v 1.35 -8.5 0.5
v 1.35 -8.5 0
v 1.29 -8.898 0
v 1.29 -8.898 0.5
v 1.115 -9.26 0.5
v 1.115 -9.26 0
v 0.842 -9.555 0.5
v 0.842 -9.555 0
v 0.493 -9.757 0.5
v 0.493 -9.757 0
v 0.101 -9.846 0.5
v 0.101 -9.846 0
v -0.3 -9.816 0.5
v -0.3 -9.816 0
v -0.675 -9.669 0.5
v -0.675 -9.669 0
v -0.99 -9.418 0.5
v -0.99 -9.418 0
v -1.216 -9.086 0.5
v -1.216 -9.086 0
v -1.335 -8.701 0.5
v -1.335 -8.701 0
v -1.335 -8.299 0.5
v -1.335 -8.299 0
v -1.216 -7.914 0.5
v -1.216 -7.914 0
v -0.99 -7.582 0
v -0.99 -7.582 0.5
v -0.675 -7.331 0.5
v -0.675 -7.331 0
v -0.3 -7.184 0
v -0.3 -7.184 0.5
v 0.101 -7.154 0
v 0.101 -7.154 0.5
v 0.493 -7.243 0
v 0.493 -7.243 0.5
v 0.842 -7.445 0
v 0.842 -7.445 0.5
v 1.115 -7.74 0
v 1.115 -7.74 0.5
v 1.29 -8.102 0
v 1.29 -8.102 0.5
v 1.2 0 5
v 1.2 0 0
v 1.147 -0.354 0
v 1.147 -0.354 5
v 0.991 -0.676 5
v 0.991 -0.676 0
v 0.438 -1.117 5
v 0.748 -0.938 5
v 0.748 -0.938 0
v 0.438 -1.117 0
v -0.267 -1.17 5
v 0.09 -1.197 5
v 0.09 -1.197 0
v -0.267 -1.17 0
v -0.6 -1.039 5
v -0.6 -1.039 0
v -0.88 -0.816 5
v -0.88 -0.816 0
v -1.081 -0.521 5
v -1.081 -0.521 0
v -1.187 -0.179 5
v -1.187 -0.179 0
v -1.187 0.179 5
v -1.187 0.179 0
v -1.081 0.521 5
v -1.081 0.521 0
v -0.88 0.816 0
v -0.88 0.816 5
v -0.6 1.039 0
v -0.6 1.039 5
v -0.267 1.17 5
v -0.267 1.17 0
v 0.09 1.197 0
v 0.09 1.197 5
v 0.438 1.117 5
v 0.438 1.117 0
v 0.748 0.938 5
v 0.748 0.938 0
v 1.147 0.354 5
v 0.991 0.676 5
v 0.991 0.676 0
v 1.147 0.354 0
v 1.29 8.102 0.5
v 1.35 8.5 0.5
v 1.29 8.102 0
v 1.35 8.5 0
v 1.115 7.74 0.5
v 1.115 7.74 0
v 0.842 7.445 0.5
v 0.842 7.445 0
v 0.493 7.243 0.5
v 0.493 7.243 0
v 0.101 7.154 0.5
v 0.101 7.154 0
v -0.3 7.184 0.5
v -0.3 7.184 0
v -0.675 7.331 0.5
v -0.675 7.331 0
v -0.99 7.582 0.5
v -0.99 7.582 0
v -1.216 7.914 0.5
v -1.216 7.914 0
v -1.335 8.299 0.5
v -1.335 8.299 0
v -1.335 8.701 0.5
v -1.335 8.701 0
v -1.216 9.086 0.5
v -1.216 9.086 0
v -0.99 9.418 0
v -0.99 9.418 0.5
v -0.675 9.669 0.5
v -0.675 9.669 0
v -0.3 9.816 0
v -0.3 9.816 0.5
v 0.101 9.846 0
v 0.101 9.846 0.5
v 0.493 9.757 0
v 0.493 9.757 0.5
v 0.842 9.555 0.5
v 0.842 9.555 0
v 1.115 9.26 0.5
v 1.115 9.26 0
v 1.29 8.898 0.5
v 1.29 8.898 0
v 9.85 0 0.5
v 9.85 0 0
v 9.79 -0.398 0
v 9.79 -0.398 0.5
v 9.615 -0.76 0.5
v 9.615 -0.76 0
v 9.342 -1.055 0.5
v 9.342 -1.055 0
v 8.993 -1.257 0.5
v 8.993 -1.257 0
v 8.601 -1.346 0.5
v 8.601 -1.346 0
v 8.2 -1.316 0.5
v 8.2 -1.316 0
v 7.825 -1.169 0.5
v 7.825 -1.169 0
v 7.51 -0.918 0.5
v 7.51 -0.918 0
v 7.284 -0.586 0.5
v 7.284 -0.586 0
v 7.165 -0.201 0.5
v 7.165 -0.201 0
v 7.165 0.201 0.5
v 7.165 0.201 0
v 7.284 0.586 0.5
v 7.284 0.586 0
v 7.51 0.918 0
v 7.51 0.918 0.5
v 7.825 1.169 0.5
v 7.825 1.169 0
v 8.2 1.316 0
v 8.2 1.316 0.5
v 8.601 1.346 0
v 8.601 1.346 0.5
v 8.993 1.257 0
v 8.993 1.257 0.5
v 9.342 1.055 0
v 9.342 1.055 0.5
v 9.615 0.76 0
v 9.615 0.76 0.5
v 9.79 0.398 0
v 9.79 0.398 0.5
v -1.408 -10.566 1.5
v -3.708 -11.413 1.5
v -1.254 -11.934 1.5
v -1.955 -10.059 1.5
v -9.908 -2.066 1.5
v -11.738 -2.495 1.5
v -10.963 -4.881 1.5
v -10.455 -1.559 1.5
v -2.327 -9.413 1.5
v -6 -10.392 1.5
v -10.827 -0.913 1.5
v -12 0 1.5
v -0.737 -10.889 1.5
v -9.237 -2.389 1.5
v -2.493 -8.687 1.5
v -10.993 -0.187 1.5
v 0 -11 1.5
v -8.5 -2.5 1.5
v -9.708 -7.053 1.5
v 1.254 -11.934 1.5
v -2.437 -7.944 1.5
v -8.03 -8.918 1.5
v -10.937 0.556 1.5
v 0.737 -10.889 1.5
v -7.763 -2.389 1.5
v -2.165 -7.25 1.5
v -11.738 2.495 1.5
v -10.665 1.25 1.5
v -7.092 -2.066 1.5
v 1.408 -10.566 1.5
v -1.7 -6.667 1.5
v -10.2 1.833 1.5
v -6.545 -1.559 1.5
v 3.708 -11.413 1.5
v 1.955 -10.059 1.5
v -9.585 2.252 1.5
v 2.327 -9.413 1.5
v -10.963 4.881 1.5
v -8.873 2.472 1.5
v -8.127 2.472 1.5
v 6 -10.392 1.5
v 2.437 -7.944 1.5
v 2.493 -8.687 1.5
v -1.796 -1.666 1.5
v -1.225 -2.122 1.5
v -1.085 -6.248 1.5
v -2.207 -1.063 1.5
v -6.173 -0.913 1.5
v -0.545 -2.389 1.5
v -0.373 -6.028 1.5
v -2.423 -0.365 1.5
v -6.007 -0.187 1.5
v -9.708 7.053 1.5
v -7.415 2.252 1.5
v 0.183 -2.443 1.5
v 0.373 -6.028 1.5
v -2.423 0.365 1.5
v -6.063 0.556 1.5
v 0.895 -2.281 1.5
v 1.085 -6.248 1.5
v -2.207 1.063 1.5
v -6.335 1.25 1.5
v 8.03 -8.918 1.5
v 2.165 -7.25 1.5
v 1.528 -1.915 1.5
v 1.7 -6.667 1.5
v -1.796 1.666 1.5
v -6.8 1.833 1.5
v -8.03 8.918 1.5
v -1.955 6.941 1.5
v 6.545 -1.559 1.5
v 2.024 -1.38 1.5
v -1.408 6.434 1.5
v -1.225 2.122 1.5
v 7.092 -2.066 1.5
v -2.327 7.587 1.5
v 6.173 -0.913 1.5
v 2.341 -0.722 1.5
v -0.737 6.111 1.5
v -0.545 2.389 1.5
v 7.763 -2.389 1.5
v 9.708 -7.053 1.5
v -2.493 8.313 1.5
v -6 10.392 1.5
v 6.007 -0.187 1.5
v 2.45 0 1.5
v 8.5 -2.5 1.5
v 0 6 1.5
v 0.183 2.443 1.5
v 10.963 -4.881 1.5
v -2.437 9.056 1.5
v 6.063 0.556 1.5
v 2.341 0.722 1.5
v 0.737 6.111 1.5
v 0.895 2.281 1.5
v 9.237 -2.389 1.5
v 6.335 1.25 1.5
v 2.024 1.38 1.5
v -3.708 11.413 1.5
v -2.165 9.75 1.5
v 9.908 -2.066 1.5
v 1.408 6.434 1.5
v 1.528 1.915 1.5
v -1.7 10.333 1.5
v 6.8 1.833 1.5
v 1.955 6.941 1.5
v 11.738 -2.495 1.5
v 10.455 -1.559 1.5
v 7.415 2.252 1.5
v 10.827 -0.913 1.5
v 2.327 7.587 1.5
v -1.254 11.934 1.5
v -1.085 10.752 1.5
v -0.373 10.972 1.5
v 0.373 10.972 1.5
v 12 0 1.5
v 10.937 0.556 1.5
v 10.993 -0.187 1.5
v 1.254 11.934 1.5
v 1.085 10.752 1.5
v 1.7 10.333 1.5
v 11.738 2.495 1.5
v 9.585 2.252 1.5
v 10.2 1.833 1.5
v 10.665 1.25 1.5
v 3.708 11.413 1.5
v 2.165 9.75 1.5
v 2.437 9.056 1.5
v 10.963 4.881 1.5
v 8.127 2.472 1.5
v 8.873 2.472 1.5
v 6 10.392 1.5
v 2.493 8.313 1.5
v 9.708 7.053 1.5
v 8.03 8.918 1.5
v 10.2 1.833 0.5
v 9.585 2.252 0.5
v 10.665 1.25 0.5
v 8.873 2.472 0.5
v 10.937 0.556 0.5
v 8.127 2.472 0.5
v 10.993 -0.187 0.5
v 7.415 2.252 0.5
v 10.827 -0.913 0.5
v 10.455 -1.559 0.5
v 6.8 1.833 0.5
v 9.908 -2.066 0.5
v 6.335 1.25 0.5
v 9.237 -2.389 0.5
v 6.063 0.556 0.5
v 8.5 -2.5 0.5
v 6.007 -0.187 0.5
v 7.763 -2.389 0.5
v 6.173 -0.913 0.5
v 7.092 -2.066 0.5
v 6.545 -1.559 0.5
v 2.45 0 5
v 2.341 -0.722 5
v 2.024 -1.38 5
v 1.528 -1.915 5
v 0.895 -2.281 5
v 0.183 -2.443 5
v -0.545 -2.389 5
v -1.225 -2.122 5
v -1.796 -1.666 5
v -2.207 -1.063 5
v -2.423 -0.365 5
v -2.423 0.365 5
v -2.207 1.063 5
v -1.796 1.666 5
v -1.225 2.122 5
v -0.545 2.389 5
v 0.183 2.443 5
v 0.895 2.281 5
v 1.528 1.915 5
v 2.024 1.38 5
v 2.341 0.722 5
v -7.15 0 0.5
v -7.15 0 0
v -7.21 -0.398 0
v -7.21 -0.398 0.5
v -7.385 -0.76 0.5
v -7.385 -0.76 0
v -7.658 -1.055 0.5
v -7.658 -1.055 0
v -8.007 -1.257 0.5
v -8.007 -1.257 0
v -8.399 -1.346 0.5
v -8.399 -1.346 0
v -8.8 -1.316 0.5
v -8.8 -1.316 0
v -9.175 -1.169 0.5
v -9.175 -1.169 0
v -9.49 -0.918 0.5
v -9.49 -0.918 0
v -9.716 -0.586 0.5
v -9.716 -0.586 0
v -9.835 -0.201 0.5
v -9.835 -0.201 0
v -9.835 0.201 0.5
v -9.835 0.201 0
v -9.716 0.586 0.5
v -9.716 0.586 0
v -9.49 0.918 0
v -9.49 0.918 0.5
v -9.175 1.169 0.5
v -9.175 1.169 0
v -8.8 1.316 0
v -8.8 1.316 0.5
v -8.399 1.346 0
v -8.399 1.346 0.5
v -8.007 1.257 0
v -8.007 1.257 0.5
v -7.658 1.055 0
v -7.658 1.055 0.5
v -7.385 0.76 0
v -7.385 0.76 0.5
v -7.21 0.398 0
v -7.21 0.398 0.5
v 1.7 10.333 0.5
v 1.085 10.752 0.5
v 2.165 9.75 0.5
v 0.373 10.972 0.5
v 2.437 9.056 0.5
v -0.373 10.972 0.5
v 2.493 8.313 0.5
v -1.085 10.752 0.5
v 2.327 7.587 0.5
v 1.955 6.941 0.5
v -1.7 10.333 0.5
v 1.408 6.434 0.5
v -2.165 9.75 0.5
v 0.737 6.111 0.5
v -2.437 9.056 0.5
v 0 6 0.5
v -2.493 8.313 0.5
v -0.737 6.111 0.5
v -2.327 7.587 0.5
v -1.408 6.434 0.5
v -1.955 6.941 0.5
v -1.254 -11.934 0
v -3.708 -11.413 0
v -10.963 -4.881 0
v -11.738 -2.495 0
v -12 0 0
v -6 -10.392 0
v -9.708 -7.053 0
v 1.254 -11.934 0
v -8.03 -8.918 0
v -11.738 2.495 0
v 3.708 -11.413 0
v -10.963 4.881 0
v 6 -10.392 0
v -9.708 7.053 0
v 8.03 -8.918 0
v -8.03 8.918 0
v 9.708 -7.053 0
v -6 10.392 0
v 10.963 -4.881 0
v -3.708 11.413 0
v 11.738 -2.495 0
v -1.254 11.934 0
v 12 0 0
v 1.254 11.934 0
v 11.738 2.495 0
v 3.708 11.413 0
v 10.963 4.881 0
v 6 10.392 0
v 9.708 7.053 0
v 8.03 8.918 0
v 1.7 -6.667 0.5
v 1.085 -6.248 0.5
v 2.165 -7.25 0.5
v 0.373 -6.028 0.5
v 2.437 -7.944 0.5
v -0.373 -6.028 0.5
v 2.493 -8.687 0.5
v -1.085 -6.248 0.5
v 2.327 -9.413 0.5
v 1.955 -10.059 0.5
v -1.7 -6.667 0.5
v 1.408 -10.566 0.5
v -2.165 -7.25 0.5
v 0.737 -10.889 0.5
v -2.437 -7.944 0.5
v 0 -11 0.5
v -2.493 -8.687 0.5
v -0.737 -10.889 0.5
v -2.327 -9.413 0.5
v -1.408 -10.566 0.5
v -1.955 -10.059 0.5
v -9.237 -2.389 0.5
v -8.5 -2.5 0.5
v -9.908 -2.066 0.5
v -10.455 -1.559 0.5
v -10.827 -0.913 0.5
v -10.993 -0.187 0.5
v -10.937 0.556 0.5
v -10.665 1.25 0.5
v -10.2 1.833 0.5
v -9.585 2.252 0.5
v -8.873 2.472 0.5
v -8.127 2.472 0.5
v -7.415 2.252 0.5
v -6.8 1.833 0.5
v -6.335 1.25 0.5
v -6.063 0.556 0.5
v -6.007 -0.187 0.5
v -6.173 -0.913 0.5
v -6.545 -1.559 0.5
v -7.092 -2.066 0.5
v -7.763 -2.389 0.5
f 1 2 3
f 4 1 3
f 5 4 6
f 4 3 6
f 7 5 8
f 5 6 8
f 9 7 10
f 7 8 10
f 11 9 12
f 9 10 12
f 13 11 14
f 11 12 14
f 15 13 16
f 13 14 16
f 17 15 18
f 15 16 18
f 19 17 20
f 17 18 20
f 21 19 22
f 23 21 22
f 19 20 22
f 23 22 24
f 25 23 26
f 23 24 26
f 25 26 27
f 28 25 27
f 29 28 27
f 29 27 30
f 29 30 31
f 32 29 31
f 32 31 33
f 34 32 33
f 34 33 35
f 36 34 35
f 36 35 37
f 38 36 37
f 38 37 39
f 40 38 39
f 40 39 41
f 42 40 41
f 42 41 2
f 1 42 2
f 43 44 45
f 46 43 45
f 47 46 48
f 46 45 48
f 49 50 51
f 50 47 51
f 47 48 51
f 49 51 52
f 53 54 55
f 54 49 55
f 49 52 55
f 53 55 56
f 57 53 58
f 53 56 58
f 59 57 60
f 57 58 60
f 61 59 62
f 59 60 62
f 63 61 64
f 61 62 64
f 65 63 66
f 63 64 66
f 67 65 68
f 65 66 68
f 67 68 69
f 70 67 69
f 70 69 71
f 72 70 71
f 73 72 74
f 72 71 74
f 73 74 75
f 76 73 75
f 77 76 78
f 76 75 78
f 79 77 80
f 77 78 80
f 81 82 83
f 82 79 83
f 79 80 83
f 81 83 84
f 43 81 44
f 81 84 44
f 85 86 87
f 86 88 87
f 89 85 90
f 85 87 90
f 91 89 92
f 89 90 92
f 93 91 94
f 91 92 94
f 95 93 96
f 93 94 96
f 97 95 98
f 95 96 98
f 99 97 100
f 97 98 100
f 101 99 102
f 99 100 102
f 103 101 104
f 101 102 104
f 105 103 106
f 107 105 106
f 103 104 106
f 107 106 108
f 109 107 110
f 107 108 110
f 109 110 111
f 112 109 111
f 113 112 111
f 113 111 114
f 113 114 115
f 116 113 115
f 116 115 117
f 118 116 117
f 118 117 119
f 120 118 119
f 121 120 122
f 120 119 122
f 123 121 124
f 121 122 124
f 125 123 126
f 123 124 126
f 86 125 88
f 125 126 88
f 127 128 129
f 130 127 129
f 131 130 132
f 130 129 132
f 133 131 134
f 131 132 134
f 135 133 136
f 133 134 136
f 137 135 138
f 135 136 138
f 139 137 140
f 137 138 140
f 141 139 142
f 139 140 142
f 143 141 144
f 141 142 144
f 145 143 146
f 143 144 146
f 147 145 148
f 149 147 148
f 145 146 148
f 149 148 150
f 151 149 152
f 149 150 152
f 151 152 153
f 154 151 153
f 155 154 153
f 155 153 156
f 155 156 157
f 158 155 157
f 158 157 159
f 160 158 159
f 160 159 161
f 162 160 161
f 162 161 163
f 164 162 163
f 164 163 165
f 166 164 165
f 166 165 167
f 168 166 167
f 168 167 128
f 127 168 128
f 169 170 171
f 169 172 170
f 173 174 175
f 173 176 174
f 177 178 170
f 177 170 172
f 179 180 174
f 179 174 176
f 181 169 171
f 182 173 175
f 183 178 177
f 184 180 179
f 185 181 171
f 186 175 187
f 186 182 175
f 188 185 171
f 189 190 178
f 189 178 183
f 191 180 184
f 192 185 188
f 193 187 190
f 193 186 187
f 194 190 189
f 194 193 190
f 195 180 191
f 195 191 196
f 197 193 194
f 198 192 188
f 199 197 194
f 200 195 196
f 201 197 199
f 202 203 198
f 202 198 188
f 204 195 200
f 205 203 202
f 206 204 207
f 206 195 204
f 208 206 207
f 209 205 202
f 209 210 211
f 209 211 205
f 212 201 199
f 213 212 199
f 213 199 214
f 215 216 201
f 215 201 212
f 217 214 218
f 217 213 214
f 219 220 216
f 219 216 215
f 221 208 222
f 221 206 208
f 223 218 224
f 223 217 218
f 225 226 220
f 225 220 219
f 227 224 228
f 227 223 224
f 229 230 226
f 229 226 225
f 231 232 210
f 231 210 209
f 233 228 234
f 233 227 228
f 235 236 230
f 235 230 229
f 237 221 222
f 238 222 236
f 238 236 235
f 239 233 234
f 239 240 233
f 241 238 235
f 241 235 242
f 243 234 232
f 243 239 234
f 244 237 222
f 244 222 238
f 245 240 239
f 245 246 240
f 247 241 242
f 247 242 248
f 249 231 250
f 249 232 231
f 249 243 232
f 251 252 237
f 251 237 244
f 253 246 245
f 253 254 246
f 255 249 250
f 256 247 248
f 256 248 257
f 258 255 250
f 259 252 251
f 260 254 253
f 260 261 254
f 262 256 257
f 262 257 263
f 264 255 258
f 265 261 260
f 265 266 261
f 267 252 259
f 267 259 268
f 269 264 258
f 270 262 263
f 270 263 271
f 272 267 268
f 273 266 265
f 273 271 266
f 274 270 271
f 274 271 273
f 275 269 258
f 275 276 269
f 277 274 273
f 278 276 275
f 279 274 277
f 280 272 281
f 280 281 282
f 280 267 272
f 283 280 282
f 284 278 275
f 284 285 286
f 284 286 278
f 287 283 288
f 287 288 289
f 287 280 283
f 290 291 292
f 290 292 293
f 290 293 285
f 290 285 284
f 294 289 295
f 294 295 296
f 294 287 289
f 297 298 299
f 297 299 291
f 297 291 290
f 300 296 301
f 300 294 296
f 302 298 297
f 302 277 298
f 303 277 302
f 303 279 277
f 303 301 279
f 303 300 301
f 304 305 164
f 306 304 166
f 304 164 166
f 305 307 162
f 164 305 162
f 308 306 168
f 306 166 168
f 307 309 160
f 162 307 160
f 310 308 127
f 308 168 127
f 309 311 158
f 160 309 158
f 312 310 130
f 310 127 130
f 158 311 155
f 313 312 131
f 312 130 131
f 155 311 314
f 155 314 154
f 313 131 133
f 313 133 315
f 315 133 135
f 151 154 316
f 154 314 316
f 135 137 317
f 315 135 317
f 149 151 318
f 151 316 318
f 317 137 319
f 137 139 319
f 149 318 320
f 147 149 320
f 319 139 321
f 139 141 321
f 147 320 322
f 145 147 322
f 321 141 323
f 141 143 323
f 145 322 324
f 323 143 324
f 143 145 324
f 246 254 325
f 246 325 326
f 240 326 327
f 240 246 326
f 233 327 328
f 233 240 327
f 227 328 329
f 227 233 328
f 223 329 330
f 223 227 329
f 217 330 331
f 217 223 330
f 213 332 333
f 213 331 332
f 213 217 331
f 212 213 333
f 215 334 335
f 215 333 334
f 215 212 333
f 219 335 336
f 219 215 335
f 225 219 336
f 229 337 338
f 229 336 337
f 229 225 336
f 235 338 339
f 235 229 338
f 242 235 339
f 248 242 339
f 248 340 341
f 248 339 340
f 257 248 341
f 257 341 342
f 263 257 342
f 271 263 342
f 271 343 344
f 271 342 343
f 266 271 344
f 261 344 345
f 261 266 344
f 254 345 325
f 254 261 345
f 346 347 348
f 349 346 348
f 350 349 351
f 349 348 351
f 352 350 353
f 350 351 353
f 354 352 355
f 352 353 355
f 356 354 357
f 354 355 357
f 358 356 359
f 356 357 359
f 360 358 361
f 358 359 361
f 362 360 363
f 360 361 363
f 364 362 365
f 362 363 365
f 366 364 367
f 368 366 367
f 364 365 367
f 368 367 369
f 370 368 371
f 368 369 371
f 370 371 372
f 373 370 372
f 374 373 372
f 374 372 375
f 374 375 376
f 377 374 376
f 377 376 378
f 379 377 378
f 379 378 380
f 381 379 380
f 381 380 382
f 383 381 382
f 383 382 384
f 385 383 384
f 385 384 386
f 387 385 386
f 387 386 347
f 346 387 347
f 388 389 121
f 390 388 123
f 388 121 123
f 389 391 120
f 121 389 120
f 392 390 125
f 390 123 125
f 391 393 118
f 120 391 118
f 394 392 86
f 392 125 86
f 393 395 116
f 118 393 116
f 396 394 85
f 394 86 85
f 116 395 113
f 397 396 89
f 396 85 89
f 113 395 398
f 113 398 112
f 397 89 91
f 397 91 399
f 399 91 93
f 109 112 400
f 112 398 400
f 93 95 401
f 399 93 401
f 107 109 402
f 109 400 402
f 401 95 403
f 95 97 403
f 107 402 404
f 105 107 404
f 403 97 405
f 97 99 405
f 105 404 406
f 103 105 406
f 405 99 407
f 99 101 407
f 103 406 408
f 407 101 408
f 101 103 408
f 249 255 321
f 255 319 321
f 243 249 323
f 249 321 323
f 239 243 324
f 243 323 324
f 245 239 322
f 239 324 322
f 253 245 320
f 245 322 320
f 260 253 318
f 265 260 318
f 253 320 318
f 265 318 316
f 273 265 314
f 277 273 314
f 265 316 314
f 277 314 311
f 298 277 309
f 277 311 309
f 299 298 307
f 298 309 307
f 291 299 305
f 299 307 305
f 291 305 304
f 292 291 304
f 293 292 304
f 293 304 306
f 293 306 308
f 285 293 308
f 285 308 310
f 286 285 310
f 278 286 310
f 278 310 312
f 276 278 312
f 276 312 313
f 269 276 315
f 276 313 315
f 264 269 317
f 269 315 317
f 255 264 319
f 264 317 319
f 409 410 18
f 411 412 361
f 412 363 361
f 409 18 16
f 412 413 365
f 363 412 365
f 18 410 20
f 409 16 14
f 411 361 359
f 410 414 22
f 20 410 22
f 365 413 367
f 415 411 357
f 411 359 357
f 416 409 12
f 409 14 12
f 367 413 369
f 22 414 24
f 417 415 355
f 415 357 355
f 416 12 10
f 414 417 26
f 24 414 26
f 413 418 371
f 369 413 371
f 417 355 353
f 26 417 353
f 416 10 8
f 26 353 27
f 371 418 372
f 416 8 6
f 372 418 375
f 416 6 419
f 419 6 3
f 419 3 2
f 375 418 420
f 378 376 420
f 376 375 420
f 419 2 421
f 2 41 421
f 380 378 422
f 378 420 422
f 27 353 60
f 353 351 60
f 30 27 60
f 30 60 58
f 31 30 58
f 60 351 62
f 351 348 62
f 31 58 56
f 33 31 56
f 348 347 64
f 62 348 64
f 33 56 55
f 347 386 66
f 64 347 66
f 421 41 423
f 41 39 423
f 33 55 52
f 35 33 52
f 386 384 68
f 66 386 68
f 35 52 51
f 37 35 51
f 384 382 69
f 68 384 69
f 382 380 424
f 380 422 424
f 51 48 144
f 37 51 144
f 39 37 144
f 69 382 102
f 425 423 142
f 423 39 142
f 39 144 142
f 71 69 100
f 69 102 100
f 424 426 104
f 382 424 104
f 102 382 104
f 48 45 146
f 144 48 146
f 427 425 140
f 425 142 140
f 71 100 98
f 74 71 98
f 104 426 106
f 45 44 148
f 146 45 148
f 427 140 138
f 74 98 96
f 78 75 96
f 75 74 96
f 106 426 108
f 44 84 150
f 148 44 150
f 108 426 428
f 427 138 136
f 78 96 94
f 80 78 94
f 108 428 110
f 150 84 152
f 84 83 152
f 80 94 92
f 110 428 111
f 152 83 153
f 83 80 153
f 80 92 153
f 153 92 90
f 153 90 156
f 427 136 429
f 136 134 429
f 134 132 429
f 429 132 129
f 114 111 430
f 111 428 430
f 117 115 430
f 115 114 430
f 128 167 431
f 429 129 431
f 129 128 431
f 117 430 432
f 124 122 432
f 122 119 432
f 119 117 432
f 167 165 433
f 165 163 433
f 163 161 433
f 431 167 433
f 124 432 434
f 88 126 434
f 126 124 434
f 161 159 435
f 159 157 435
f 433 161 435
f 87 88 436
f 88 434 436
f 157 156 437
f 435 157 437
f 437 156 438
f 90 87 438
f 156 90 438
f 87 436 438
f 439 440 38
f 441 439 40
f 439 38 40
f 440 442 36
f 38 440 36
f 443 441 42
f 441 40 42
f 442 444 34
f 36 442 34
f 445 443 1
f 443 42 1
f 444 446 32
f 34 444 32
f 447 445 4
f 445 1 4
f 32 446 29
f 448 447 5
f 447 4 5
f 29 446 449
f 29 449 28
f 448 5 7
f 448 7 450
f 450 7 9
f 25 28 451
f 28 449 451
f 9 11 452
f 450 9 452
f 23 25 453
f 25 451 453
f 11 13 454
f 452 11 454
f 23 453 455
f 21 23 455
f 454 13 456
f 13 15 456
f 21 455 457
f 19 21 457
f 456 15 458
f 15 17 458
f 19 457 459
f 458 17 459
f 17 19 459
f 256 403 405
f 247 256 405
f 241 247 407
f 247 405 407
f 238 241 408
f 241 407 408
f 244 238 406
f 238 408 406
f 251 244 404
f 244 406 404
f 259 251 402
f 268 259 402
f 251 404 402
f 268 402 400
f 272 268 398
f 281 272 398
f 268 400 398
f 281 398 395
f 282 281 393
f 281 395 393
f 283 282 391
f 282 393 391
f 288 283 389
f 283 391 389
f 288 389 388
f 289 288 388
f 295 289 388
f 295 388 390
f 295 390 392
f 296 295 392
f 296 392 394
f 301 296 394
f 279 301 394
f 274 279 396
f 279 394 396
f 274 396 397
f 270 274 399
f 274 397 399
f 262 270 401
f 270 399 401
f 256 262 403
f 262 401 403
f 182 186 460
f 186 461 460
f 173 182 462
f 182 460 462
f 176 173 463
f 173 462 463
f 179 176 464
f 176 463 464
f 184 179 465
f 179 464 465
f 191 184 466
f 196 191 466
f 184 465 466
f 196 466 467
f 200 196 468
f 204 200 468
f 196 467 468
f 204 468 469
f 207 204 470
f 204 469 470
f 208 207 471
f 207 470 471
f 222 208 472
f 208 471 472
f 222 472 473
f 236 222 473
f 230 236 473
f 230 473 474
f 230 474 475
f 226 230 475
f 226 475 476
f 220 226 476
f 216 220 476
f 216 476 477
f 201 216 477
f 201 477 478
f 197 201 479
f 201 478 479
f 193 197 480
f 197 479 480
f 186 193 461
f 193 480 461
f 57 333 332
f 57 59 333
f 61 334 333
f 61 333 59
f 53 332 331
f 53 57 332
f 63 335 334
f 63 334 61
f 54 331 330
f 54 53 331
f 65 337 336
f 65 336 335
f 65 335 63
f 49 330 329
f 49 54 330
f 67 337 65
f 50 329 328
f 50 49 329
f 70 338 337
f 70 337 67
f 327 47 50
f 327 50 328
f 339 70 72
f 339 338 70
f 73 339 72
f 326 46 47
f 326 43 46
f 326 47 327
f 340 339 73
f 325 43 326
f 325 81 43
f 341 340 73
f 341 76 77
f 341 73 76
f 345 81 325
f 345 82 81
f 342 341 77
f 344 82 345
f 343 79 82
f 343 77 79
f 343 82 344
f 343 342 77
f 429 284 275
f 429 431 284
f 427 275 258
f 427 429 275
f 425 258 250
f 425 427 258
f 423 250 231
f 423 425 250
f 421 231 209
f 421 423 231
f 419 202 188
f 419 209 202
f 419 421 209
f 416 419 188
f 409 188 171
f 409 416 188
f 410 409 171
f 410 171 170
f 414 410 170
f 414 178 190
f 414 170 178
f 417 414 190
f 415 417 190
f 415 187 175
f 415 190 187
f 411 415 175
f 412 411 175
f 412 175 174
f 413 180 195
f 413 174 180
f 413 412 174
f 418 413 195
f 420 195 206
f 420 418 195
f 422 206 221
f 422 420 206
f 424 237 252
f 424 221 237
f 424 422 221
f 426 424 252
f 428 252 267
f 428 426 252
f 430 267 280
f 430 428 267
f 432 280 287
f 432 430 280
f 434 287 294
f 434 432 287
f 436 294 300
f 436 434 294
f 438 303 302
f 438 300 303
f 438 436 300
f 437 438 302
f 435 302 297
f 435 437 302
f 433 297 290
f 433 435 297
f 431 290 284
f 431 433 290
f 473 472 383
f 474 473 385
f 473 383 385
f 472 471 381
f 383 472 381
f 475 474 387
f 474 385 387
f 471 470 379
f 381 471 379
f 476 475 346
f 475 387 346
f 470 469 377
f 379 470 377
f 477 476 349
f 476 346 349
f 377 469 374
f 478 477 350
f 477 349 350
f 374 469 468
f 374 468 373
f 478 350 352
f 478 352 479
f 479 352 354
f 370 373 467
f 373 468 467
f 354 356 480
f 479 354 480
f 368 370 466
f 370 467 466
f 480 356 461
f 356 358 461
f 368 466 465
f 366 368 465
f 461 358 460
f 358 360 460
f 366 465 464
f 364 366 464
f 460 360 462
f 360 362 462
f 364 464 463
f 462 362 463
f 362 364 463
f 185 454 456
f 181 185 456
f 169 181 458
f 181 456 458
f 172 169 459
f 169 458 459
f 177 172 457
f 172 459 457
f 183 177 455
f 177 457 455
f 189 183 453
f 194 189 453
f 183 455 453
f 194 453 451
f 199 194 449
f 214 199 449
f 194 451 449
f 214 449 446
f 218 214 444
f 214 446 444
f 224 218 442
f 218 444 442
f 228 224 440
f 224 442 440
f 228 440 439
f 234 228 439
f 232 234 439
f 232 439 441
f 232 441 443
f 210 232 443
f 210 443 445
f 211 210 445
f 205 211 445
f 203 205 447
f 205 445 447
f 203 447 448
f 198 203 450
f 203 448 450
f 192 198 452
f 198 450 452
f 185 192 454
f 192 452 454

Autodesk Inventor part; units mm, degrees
ref_plane "YZ Plane" through (0, 0, 0) normal (1, 0, 0) x (0, 1, 0)
ref_plane "XZ Plane" through (0, 0, 0) normal (0, 1, 0) x (-1, 0, 0)
ref_plane "XY Plane" through (0, 0, 0) normal (0, 0, 1) x (1, 0, 0)
sketch "スケッチ1" plane through (0, 0, 0) normal (0, 0, 1) x (1, 0, 0)
  circle A0 centre (0, 0) radius 12
  circle A1 centre (0, 8.5) radius 1.35
  circle A2 centre (0, 0) radius 1.2
  circle A3 centre (-8.5, 0) radius 1.35
  circle A4 centre (0, -8.5) radius 1.35
  circle A5 centre (8.5, 0) radius 1.35
  dimension "d0" = 2.7
  dimension "d1" = 8.5
  dimension "d2" = 24
  dimension "d3" = 2.4
  dimension "d6" = 360
extrude "押し出し1" add sketch "スケッチ1" along normal blind 1.5
sketch "スケッチ2" plane through (0, 0, 1.5) normal (0, 0, 1) x (1, 0, 0)
  circle A0 centre (0, 0) radius 1.2 projected
  circle A1 centre (0, 0) radius 12 projected
  circle A2 centre (0, 0) radius 2.45
  dimension "d10" = 4.9
extrude "押し出し2" add sketch "スケッチ2" along normal blind 3.5 contours A2
sketch "スケッチ3" plane through (0, 0, 1.5) normal (0, 0, 1) x (1, 0, 0)
  circle A0 centre (0, 0) radius 2.45 projected
  circle A1 centre (0, 8.5) radius 1.35 projected
  point P0 (-8.5, 0)
  point P1 (0, -8.5)
  point P2 (8.5, 0)
  dimension "d15" = 360
hole "穴1" at (0, 8.5, 1.5) at (-8.5, 0, 1.5) at (0, -8.5, 1.5) at (8.5, 0, 1.5) direction (0, 0, -1) diameter 5 depth 1
properties part number "足首_独立ピッチ_1_2" material "アルミニウム 2014-T4"
